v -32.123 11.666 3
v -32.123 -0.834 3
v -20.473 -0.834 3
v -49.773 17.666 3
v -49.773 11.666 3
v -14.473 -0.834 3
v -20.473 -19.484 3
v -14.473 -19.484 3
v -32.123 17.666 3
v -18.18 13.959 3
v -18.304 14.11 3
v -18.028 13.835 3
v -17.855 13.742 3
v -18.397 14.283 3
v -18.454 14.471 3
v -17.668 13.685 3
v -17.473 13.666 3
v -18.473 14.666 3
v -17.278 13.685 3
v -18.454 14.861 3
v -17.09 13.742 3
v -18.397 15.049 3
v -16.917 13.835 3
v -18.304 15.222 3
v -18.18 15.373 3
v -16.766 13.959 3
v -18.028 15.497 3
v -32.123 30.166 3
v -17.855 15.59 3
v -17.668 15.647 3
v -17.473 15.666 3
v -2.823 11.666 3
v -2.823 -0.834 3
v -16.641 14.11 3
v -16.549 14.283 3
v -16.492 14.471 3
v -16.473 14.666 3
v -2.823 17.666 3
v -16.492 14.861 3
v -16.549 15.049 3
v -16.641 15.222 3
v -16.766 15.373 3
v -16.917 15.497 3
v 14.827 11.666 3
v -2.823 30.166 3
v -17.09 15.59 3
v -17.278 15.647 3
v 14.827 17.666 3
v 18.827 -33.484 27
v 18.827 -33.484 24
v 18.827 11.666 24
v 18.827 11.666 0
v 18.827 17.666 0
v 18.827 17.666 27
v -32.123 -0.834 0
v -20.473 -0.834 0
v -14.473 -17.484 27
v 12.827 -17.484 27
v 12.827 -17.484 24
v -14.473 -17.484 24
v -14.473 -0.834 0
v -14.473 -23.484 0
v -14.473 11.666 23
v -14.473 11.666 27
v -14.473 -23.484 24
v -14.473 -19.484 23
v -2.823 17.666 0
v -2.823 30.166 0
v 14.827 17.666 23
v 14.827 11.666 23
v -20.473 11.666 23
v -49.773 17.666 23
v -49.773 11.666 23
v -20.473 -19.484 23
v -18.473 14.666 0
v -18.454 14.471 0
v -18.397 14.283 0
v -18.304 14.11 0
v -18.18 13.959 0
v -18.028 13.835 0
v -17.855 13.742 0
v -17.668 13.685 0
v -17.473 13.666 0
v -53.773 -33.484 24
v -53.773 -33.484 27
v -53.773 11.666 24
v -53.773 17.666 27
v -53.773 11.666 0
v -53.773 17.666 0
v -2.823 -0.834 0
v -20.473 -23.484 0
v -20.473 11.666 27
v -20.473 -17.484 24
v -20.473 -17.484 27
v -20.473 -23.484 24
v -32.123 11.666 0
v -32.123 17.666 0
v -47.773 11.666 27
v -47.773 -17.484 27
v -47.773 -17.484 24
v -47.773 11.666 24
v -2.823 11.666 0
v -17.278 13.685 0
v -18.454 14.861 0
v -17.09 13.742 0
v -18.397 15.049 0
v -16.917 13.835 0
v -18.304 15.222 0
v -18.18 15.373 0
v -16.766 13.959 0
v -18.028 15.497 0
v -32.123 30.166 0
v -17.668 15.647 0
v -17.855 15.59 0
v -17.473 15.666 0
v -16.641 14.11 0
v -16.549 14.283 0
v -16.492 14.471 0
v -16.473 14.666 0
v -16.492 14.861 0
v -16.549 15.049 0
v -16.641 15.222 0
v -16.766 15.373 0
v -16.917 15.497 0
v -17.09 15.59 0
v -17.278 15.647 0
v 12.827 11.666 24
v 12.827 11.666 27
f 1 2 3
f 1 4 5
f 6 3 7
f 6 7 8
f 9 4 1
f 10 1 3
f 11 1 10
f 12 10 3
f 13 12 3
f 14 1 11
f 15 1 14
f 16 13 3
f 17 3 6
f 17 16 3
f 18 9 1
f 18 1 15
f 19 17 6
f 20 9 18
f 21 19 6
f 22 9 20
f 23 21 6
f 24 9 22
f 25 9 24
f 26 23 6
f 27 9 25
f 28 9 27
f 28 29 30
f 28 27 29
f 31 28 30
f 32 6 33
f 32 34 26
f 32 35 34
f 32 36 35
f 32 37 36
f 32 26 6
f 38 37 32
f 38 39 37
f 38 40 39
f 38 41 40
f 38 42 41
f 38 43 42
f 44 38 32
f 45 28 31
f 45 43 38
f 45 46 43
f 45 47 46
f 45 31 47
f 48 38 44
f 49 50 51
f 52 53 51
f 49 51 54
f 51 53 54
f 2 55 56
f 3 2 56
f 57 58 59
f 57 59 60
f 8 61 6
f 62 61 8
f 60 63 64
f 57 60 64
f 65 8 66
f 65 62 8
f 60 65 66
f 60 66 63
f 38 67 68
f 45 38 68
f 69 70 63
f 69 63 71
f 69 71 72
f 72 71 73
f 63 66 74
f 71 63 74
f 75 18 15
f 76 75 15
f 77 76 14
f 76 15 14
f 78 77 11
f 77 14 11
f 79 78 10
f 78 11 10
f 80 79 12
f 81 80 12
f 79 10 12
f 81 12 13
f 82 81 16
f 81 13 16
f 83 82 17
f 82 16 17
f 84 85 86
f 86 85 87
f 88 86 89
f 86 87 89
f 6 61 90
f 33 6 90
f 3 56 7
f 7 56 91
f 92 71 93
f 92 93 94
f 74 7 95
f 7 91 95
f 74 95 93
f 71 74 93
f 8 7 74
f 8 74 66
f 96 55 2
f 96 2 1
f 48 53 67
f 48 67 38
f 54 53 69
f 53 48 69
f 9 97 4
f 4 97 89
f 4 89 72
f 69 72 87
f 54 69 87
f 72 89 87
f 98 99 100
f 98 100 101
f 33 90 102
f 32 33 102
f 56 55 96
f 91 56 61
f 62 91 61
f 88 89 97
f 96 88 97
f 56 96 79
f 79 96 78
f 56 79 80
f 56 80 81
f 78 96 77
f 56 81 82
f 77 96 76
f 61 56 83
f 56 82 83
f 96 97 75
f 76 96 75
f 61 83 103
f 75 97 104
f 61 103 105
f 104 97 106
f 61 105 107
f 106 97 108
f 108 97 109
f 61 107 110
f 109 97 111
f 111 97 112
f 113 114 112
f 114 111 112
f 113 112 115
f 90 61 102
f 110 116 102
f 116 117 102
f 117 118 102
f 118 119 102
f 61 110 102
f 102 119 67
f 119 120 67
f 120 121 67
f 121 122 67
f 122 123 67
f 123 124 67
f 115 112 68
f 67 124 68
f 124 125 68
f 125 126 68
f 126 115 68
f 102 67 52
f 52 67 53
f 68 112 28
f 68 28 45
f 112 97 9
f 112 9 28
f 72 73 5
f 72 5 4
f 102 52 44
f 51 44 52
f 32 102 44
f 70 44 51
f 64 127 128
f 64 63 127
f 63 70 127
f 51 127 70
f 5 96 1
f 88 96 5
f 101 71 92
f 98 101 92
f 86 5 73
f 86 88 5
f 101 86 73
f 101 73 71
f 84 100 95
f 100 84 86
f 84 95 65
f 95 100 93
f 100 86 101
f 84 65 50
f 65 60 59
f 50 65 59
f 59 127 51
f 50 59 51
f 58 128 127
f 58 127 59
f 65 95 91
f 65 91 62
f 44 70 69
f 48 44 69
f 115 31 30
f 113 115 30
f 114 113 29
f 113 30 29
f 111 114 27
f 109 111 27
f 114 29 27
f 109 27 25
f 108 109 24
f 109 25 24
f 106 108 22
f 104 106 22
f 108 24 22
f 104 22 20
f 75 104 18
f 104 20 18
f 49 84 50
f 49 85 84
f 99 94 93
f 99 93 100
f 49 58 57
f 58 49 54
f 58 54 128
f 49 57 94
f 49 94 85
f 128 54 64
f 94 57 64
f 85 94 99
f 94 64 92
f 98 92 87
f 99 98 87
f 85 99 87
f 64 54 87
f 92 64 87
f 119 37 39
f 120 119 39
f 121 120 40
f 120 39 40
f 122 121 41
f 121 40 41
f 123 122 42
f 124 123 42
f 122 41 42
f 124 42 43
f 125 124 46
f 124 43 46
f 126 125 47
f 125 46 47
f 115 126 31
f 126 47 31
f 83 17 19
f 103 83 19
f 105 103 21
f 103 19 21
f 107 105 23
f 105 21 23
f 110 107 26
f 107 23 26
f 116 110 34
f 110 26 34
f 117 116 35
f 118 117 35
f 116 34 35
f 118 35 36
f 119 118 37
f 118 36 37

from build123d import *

# Parameters (mm, degrees)
F0_W      = 29.3
F0_H      = 31
F1_DEPTH  = 3
F2_W      = 6
F2_H      = 3
F5_DEPTH  = 21.65
F3_W      = 6
F3_H      = 3
F6_DEPTH  = 21.65
F4_W      = 6
F4_H      = 3
F7_DEPTH  = 22.65
F8_W      = 4
F8_H      = 6
F8_W_2    = 6
F8_H_2    = 4
F9_DEPTH  = 24
F10_W     = 6
F10_H     = 4
F13_DEPTH = 35.95
F11_W     = 6
F11_H     = 4
F14_DEPTH = 35.95
F12_W     = 6
F12_H     = 4
F15_DEPTH = 33.8
F17_DEPTH = 4
F19_DEPTH = 3
F21_DEPTH = 10


with BuildPart() as f1:
    # F0 (on Top) → F1 (new body)
    with BuildSketch(Plane.XY):
        with Locations((-17.4727943537, 14.6659919992)):
            Rectangle(F0_W, F0_H)
    extrude(amount=F1_DEPTH)

    # F2 (on face) → F5 (join)
    with BuildSketch(Plane.YZ.offset(-2.8227943537)):
        with Locations((14.6659919992, 1.5)):
            Rectangle(F2_W, F2_H)
    extrude(amount=F5_DEPTH)

    # F3 (on face) → F6 (join)
    with BuildSketch(Plane(origin=(-32.1227943537, 0, 0), x_dir=(0, -1, 0), z_dir=(-1, 0, 0))):
        with Locations((-14.6659919992, 1.5)):
            Rectangle(F3_W, F3_H)
    extrude(amount=F6_DEPTH)

    # F4 (on face) → F7 (join)
    with BuildSketch(Plane.XZ.offset(0.8340080008)):
        with Locations((-17.4727943537, 1.5)):
            Rectangle(F4_W, F4_H)
    extrude(amount=F7_DEPTH)

    # F8 (on face) → F9 (join)
    with BuildSketch(Plane.XY.offset(3)):
        with Locations((16.8272056463, 14.6659919992)):
            Rectangle(F8_W, F8_H)
        with Locations((-17.4727943537, -21.4840080008)):
            Rectangle(F8_W_2, F8_H_2)
        with Locations((-51.7727943537, 14.6659919992)):
            Rectangle(F8_W, F8_H)
    extrude(amount=F9_DEPTH)

    # F10 (on face) → F13 (join)
    with BuildSketch(Plane(origin=(14.8272056463, 0, 0), x_dir=(0, -1, 0), z_dir=(-1, 0, 0))):
        with Locations((-14.6659919992, 25)):
            Rectangle(F10_W, F10_H)
    extrude(amount=F13_DEPTH)

    # F11 (on face) → F14 (join)
    with BuildSketch(Plane.YZ.offset(-49.7727943537)):
        with Locations((14.6659919992, 25)):
            Rectangle(F11_W, F11_H)
    extrude(amount=F14_DEPTH)

    # F12 (on face) → F15 (join)
    with BuildSketch(Plane(origin=(0, -19.4840080008, 0), x_dir=(-1, 0, 0), z_dir=(0, 1, 0))):
        with Locations((17.4727943537, 25)):
            Rectangle(F12_W, F12_H)
    extrude(amount=F15_DEPTH)

    # F16 (on face) → F17 (cut)
    with BuildSketch(Plane.XY.offset(3)):
        with BuildLine():
            ThreePointArc((-17.4727943537, 13.6659919992), (-16.7656875725, 13.958885218), (-16.4727943537, 14.6659919992))
            Line((-16.4727943537, 14.6659919992), (-17.4727943537, 14.6659919992))
            Line((-17.4727943537, 14.6659919992), (-17.4727943537, 13.6659919992))
        make_face()
        with BuildLine():
            Line((-17.4727943537, 14.6659919992), (-16.4727943537, 14.6659919992))
            ThreePointArc((-16.4727943537, 14.6659919992), (-16.7656875725, 15.3730987804), (-17.4727943537, 15.6659919992))
            Line((-17.4727943537, 15.6659919992), (-17.4727943537, 14.6659919992))
        make_face()
        with BuildLine():
            Line((-18.4727943537, 14.6659919992), (-17.4727943537, 14.6659919992))
            Line((-17.4727943537, 14.6659919992), (-17.4727943537, 15.6659919992))
            ThreePointArc((-17.4727943537, 15.6659919992), (-18.1799011348, 15.3730987804), (-18.4727943537, 14.6659919992))
        make_face()
        with BuildLine():
            Line((-17.4727943537, 13.6659919992), (-17.4727943537, 14.6659919992))
            Line((-17.4727943537, 14.6659919992), (-18.4727943537, 14.6659919992))
            ThreePointArc((-18.4727943537, 14.6659919992), (-18.1799011348, 13.958885218), (-17.4727943537, 13.6659919992))
        make_face()
    extrude(amount=-F17_DEPTH, mode=Mode.SUBTRACT)

    # F18 (on face) → F19 (join)
    with BuildSketch(Plane.XY.offset(27)):
        Polygon((-14.4727943537, -17.4840080008), (-14.4727943537, -23.4840080008), (18.8272056463, -23.4840080008), (18.8272056463, 11.6659919992), (12.8272056463, 11.6659919992), (12.8272056463, -17.4840080008), align=None)
        Polygon((-47.7727943537, 11.6659919992), (-53.7727943537, 11.6659919992), (-53.7727943537, -23.4840080008), (-20.4727943537, -23.4840080008), (-20.4727943537, -17.4840080008), (-47.7727943537, -17.4840080008), align=None)
    extrude(amount=-F19_DEPTH)

    # F20 (on face) → F21 (join)
    with BuildSketch(Plane.XZ.offset(23.4840080008)):
        Polygon((-53.7727943537, 24), (-20.4727943537, 24), (-14.4727943537, 24), (18.8272056463, 24), (18.8272056463, 27), (-53.7727943537, 27), align=None)
    extrude(amount=F21_DEPTH)


solid = f1.part
